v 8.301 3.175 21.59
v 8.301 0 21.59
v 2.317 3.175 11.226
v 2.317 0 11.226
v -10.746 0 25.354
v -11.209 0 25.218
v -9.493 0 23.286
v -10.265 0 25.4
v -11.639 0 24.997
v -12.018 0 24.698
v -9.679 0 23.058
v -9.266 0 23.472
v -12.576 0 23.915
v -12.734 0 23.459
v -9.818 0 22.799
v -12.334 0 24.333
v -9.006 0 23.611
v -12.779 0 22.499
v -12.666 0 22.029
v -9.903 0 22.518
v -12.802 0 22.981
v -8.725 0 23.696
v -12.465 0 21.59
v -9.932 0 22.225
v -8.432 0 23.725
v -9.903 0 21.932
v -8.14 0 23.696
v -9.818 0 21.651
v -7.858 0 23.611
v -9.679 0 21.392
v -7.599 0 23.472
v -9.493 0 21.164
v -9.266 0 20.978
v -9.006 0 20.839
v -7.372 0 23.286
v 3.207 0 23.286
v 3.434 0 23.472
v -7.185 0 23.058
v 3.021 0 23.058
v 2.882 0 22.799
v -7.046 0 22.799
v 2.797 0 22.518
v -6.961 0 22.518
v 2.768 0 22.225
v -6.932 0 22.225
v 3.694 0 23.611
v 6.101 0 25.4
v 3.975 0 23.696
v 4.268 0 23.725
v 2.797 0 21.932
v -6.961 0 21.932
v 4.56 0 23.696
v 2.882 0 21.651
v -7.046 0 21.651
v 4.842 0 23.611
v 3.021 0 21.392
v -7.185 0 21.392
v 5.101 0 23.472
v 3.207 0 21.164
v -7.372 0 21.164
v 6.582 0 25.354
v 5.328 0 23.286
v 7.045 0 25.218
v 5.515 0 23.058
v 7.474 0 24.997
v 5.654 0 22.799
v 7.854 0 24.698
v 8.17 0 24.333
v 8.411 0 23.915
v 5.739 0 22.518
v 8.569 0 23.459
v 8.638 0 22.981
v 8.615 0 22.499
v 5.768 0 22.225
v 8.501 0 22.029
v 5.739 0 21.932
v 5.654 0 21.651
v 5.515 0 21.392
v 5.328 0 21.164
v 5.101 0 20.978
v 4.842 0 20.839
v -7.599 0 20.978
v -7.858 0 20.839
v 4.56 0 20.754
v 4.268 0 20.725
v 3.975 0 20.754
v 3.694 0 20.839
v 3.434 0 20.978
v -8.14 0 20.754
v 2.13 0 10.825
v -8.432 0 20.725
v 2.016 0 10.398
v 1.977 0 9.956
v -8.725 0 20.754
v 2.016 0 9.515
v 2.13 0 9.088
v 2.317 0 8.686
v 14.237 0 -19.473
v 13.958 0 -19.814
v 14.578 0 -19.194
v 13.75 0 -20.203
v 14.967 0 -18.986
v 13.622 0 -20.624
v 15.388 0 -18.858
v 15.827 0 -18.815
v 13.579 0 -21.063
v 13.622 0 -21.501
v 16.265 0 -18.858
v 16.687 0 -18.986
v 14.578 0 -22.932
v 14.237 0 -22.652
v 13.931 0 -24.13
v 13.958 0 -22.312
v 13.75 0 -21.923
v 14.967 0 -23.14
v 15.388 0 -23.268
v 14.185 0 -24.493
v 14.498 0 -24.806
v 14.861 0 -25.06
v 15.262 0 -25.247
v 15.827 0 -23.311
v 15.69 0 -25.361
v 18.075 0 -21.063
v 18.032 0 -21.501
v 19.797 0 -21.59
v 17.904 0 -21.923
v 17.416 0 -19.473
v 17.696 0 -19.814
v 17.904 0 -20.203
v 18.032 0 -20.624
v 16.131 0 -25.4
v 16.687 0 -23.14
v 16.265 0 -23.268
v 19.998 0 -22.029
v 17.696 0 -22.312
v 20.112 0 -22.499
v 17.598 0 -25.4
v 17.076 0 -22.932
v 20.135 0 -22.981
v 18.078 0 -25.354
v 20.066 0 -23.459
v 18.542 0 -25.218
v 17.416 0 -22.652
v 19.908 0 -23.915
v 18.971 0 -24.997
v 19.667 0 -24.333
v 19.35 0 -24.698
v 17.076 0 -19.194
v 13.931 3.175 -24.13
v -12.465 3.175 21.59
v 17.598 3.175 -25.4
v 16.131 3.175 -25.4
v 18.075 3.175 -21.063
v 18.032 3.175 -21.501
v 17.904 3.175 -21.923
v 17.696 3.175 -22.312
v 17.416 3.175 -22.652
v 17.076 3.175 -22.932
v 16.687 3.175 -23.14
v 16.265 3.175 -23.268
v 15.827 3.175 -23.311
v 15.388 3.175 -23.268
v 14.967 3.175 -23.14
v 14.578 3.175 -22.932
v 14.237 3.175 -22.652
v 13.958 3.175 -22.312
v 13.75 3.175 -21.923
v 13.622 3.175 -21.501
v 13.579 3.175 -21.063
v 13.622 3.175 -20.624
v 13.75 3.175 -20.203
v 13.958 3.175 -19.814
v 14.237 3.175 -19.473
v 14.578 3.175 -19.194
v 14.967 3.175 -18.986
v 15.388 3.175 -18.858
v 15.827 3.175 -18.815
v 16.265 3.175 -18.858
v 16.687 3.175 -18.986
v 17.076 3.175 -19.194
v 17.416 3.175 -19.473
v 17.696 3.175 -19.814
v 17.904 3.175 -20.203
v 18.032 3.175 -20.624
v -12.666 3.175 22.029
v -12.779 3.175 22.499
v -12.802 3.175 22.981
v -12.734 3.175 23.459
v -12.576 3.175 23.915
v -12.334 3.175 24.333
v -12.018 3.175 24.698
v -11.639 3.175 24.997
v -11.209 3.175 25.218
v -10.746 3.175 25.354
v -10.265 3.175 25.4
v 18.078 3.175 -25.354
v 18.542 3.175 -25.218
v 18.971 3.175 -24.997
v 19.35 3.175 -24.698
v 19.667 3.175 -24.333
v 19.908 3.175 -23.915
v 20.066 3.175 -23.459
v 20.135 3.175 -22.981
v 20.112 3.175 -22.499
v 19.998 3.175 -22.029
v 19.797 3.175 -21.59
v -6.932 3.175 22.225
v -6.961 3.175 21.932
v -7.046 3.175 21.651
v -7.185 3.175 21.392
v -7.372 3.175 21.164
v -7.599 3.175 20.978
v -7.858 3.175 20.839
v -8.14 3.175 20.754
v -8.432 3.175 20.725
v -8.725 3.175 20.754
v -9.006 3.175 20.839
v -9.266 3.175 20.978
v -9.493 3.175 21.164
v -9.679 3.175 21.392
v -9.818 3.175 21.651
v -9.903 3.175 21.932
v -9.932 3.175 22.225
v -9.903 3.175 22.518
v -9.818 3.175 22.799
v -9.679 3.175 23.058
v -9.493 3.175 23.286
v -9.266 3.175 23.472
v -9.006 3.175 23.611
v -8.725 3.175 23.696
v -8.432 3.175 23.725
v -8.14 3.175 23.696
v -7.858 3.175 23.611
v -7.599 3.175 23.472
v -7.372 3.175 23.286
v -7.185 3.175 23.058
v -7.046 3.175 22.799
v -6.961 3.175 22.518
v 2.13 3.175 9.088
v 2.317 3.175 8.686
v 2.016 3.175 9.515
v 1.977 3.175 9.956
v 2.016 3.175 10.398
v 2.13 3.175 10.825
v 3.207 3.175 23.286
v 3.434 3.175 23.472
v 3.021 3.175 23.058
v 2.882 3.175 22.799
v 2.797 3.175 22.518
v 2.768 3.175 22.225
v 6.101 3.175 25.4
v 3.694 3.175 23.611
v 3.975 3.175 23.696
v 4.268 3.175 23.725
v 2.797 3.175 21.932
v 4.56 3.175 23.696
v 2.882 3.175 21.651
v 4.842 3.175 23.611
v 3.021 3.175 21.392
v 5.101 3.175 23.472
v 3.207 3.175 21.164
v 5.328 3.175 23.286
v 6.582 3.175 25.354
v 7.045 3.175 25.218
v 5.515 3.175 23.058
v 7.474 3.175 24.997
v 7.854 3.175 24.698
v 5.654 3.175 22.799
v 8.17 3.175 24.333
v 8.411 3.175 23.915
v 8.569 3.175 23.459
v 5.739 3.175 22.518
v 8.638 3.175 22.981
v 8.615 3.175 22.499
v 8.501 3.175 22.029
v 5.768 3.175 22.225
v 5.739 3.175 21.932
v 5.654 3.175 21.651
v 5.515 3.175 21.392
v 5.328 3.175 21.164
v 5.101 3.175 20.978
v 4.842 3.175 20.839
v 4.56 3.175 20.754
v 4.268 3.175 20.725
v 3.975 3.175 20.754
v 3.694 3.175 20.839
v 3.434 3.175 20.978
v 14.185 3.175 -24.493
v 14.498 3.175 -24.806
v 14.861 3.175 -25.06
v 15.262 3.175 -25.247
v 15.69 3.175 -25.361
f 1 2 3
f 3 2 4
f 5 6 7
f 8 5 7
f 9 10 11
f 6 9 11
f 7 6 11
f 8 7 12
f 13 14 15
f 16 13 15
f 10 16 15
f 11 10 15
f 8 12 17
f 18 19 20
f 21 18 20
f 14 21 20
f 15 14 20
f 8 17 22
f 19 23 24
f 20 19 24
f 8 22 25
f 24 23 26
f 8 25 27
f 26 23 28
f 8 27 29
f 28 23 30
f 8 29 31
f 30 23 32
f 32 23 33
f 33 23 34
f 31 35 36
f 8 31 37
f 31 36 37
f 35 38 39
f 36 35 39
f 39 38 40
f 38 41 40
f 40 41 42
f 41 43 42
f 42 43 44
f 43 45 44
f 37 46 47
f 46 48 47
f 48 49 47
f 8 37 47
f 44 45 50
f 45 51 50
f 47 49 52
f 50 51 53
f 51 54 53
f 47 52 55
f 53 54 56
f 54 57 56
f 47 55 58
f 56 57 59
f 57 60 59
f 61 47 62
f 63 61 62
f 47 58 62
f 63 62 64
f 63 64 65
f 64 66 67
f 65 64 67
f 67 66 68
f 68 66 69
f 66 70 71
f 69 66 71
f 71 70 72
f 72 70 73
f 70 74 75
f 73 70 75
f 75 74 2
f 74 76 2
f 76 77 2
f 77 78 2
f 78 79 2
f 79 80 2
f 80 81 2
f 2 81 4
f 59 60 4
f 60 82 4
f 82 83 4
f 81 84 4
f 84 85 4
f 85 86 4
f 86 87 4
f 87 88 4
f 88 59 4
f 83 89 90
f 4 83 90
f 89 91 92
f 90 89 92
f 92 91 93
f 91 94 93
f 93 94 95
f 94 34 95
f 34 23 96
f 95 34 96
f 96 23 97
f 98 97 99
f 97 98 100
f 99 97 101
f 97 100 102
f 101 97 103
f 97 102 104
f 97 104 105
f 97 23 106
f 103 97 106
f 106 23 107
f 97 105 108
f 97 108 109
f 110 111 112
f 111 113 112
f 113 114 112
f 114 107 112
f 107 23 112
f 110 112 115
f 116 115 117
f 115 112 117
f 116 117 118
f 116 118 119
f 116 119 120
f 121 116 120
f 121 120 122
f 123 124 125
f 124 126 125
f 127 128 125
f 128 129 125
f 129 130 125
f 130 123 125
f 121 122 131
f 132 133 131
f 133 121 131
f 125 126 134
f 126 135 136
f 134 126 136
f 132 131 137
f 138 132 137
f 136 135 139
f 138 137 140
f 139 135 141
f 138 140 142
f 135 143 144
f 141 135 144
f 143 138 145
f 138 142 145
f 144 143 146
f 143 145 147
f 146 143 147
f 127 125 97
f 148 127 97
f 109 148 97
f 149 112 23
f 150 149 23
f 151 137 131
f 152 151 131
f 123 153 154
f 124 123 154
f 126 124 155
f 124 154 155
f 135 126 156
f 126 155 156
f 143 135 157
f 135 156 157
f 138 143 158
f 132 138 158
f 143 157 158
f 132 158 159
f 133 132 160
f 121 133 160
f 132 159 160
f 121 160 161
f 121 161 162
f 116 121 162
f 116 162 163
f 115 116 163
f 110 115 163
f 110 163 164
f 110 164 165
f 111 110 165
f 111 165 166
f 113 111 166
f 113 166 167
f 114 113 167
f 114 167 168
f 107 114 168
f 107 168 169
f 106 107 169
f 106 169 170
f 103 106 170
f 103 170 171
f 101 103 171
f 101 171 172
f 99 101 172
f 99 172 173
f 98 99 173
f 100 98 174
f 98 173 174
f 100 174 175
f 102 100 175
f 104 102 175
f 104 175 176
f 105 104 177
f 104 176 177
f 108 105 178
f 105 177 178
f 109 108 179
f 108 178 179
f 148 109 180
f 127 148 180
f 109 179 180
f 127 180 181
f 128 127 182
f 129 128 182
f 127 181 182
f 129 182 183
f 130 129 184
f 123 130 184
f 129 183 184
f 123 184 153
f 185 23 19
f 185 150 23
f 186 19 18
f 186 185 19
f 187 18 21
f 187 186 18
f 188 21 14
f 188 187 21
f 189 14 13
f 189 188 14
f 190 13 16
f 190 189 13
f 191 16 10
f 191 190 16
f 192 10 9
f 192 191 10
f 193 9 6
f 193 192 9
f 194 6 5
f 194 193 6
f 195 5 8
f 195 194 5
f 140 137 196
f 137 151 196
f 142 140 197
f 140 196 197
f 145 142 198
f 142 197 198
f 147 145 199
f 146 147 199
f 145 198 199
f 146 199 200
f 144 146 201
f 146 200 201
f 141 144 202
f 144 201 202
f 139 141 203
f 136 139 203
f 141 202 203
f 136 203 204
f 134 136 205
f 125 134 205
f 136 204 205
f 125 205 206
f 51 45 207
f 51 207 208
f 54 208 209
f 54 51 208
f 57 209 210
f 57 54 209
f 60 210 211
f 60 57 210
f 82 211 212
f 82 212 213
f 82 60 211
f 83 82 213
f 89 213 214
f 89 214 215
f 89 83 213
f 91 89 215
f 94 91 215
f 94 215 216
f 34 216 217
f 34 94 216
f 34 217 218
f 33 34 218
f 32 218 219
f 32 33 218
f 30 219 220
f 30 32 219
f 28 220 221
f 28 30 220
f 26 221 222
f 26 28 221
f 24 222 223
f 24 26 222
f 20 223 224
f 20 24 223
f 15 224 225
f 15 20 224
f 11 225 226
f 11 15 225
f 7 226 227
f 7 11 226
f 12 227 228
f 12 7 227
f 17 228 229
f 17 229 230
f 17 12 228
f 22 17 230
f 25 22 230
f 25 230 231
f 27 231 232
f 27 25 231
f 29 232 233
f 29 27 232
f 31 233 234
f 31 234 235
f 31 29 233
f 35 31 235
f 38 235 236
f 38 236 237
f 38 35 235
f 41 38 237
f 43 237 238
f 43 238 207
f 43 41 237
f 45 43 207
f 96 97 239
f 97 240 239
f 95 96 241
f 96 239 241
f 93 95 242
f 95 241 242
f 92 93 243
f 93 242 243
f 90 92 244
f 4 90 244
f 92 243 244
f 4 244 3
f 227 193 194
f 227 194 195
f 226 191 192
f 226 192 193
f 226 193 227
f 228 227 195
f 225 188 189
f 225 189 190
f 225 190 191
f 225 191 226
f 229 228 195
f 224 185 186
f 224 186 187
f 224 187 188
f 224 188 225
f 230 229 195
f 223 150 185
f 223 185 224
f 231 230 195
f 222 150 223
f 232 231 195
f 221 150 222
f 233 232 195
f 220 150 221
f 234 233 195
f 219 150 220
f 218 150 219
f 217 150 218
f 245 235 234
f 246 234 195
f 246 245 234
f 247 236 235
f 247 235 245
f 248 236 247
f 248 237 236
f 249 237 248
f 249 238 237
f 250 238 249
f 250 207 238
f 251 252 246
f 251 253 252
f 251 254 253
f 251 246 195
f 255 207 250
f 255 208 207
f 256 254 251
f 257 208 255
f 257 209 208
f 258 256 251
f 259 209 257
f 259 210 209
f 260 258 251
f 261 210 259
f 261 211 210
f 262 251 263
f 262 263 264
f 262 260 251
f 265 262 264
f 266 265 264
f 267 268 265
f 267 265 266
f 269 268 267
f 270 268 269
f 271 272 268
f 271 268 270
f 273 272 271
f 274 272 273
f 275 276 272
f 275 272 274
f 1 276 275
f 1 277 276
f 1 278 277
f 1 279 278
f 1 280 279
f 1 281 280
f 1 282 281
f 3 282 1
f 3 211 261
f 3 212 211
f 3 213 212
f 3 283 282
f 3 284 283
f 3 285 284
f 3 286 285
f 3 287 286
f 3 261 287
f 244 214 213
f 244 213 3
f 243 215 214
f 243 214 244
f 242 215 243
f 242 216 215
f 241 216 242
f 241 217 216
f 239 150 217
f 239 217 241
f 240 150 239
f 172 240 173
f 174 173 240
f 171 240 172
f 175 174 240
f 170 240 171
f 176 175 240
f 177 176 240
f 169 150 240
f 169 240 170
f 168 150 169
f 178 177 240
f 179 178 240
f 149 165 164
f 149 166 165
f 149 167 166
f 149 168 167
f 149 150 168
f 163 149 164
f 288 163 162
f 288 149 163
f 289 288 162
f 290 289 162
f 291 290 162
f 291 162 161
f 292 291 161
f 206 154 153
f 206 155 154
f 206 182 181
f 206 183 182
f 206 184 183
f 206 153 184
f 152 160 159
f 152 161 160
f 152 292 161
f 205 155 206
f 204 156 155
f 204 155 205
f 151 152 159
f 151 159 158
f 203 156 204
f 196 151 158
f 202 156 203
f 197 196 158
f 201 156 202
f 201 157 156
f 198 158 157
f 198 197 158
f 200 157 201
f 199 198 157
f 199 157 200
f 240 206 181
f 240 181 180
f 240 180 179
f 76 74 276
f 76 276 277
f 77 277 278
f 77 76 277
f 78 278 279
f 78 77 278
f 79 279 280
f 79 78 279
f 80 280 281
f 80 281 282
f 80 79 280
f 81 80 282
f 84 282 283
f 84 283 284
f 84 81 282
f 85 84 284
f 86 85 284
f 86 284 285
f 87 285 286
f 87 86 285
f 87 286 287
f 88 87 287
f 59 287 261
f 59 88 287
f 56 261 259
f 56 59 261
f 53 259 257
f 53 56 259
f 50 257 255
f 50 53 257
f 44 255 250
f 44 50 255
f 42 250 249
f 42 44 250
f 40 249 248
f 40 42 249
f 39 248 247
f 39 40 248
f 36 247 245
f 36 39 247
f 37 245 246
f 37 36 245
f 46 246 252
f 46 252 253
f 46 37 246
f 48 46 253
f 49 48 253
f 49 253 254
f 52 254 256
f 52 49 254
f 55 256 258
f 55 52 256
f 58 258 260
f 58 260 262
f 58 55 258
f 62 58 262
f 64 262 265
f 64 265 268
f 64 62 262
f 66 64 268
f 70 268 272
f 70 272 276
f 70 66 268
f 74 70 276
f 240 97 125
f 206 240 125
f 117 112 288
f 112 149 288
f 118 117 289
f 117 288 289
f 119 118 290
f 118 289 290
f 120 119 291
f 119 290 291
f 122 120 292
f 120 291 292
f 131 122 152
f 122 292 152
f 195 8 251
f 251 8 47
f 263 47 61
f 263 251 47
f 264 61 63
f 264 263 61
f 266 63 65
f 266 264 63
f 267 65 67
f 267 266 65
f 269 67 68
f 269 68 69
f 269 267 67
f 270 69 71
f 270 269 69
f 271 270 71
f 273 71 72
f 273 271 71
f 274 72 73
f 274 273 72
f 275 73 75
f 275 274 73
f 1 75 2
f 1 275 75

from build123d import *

# Parameters (mm, degrees)
SKETCH1_R           = 1.5
BOSS_EXTRUDE1_DEPTH = 3.175
SKETCH2_R           = 2.2479
CUT_EXTRUDE1_DEPTH  = 4.175
FILLET1_R           = 2.54


with BuildPart() as part:
    # Sketch1 → Boss-Extrude1 (new body)
    with BuildSketch(Plane(origin=(0, 0, 0), x_dir=(1, 0, 0), z_dir=(0, 1, 0))):
        Polygon((14.664696837, 25.4), (-14.664696837, -25.4), (10.500295474, -25.4), (1.583973528, -9.956477372), (21.997045256, 25.4), align=None)
        with Locations((-8.432200682, -22.225)):
            Circle(SKETCH1_R, mode=Mode.SUBTRACT)
        with Locations((4.267799318, -22.225)):
            Circle(SKETCH1_R, mode=Mode.SUBTRACT)
    extrude(amount=BOSS_EXTRUDE1_DEPTH)

    # Sketch2 → Cut-Extrude1 (cut, through all)
    with BuildSketch(Plane(origin=(0, 3.175, 0), x_dir=(1, 0, 0), z_dir=(0, 1, 0))):
        with Locations((15.826827494, 21.062869343)):
            Circle(SKETCH2_R)
    extrude(amount=-CUT_EXTRUDE1_DEPTH, mode=Mode.SUBTRACT)

    # Fillet1
    fillet1_edges = [part.edges().sort_by_distance(p)[0] for p in [
        (-14.664696837, 1.5875, 25.4),
        (14.664696837, 1.5875, -25.4),
        (21.997045256, 1.5875, -25.4),
        (1.583973528, 1.5875, 9.956477372),
        (10.500295474, 1.5875, 25.4),
    ]]
    fillet(fillet1_edges, radius=FILLET1_R)


solid = part.part
